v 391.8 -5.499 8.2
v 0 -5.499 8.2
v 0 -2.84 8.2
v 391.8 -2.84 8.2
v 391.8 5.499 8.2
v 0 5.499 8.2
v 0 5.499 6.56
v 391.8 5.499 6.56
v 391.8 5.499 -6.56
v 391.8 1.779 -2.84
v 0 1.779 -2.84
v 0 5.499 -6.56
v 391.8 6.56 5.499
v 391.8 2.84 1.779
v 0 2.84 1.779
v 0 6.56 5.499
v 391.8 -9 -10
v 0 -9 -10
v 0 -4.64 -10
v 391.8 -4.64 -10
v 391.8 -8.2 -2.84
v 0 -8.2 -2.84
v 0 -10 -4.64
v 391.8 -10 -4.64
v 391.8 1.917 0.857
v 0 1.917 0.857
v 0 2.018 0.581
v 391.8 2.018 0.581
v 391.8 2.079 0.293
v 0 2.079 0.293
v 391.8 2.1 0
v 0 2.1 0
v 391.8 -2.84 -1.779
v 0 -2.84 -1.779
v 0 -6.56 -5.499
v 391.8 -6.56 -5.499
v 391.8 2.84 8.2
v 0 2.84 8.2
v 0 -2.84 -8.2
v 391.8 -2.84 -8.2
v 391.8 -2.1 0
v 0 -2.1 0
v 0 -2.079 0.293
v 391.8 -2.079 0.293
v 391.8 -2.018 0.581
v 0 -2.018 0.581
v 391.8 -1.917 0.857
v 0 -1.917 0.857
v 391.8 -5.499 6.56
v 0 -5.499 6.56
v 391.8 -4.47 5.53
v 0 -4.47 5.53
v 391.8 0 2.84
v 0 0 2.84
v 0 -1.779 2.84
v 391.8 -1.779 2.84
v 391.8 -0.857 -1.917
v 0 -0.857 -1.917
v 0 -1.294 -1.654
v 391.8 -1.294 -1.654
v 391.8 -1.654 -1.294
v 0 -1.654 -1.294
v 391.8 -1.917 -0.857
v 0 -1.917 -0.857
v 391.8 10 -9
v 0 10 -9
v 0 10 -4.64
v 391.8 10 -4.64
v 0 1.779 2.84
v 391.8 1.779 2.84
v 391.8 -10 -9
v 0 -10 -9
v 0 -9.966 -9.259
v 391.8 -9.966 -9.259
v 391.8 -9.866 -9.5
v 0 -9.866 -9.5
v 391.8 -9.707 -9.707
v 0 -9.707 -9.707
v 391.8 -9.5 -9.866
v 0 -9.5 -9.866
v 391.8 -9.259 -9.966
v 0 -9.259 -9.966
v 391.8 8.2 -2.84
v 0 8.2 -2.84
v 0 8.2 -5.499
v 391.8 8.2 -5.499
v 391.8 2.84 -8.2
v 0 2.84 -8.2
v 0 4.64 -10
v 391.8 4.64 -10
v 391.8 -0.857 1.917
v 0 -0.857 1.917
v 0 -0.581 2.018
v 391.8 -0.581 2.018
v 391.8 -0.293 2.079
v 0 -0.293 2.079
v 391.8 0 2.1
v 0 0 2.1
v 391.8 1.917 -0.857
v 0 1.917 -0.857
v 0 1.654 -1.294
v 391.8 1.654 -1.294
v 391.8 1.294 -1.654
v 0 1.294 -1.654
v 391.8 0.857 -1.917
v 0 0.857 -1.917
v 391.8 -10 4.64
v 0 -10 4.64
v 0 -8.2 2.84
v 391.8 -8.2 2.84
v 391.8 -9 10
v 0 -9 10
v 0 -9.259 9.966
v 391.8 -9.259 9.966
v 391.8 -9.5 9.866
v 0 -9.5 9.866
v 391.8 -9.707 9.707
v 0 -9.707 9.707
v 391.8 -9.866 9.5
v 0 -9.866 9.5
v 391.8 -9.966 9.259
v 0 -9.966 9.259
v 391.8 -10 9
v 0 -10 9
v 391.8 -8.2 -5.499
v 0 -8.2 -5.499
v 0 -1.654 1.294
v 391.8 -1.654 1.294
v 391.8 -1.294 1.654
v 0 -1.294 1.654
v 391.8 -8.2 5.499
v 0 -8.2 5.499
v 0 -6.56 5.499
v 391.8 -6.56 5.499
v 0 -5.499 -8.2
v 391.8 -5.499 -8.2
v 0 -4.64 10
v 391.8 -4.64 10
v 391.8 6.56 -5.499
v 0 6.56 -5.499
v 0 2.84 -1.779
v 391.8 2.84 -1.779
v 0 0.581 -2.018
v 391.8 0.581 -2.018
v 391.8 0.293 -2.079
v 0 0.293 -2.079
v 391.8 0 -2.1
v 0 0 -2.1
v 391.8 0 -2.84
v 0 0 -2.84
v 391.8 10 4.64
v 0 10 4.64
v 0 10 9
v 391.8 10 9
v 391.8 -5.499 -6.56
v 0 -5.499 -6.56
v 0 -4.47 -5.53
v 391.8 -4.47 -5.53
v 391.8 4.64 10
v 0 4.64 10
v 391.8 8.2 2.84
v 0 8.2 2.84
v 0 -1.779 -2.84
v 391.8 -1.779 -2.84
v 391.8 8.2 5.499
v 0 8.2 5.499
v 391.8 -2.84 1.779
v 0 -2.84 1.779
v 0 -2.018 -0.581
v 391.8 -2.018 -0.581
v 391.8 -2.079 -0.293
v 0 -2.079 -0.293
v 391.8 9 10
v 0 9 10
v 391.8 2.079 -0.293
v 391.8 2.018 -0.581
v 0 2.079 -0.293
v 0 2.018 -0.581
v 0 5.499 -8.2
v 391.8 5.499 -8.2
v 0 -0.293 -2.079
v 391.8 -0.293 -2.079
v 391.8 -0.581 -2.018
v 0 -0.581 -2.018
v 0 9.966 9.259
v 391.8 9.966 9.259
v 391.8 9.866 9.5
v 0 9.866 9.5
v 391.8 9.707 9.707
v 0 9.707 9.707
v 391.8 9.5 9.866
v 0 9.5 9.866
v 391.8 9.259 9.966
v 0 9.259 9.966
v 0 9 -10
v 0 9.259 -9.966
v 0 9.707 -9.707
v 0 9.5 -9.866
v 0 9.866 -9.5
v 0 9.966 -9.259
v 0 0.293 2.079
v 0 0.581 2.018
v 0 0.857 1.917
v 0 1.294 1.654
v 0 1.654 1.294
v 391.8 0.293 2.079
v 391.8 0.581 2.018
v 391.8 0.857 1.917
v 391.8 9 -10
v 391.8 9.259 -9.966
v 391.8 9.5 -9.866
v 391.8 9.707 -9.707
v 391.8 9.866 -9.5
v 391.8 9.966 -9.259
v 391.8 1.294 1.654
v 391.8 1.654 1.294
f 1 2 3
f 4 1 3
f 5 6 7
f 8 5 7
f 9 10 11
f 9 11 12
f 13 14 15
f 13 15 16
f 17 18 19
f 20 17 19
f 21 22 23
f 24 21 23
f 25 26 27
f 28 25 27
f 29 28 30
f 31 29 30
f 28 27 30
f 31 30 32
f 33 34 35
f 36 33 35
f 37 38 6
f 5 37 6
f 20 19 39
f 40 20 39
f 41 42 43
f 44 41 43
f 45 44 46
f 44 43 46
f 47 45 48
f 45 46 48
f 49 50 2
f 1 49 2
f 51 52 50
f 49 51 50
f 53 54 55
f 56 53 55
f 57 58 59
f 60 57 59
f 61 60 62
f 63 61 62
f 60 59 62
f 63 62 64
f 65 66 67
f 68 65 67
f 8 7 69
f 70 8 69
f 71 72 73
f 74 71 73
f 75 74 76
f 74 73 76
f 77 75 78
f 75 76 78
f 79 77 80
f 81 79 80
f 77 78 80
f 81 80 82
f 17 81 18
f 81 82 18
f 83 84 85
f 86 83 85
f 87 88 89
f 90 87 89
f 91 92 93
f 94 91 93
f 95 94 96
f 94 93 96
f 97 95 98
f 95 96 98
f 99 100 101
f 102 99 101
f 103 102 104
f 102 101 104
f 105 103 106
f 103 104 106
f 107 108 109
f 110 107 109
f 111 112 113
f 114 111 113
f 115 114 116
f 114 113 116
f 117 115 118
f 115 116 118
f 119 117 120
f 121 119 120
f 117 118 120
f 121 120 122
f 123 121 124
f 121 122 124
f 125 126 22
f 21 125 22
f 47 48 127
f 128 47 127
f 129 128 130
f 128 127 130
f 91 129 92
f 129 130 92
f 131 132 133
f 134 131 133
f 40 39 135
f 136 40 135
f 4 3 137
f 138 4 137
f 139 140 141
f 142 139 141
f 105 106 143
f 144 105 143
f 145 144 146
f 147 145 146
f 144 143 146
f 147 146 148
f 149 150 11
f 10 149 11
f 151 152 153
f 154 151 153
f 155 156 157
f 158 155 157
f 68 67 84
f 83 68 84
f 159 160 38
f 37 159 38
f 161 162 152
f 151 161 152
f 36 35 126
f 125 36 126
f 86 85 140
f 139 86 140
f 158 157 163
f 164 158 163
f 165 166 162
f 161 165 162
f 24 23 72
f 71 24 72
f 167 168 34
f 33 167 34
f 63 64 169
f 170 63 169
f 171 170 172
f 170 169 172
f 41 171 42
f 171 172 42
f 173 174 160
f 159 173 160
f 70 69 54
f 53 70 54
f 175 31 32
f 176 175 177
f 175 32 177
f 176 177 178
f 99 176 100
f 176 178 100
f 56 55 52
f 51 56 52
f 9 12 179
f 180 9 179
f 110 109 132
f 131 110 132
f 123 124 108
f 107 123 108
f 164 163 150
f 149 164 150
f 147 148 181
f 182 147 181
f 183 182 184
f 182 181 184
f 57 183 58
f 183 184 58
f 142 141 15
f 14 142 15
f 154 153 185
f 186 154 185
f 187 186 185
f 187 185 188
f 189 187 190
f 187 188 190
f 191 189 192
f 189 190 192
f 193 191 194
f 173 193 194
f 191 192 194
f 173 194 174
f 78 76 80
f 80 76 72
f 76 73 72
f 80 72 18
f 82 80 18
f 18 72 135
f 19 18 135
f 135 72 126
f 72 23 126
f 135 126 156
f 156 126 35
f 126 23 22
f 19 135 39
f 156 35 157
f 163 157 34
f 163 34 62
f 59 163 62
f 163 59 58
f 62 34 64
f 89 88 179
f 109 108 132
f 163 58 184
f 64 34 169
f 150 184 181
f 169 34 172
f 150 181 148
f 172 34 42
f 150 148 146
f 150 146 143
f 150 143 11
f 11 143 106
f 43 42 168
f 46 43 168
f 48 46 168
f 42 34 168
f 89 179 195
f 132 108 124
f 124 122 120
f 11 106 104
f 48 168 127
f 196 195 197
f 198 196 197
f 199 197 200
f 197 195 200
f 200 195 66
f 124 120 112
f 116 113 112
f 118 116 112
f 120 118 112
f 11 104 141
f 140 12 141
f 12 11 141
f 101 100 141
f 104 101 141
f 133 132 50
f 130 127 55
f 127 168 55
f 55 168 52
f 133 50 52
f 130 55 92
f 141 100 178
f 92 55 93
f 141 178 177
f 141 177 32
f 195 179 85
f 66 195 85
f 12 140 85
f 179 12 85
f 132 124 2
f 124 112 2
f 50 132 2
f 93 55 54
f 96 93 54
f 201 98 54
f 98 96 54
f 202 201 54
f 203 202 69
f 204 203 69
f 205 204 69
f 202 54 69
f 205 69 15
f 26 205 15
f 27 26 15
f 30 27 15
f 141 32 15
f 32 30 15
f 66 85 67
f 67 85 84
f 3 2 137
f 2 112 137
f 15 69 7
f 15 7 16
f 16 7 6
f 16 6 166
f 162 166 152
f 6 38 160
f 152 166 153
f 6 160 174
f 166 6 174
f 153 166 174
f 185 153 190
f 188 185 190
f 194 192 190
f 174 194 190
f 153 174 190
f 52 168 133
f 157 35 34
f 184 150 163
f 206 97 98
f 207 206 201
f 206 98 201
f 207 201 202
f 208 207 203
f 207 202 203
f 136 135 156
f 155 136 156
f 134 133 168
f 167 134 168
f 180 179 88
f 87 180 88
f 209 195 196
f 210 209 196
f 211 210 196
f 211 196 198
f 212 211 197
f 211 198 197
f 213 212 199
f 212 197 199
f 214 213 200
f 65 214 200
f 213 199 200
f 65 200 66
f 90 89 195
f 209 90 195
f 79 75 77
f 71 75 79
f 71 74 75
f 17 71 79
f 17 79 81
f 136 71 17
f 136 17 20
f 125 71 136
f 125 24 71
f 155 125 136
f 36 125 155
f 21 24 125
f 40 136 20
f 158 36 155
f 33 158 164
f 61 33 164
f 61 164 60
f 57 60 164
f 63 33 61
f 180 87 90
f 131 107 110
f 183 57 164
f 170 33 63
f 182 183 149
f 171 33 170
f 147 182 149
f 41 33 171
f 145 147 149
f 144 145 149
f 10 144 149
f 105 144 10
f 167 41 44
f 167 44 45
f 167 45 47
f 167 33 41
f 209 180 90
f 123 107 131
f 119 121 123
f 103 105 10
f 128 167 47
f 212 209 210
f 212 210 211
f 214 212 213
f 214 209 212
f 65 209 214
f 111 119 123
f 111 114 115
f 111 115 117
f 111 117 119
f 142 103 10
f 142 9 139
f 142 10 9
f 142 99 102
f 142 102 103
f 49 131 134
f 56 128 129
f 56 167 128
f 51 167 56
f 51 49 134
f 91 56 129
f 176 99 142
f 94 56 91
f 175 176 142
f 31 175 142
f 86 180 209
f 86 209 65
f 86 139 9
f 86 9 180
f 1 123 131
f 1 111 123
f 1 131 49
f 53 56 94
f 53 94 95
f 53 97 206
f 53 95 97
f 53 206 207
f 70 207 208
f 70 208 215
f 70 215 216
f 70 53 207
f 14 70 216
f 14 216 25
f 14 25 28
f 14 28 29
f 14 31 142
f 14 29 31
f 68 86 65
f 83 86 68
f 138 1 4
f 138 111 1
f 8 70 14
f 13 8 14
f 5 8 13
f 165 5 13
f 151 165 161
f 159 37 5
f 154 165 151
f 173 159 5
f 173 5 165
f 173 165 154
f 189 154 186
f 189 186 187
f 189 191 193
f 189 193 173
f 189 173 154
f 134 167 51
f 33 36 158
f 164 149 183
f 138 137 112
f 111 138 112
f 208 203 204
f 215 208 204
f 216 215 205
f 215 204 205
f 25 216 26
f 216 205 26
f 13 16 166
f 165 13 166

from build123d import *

# Parameters (mm, degrees)
F1_DEPTH = 391.8


# Not quite as in the source:
# - ends of sketch curves that miss each other by under 0.0002 mm in the source are joined


with BuildPart() as f1:
    # F0 (on Right) → F1 (new body)
    with BuildSketch(Plane.YZ):
        with BuildLine():
            Line((8.2, -10), (9, -10))
            ThreePointArc((9, -10), (9.7071067812, -9.7071067812), (10, -9))
            Line((10, -9), (10, -8.2))
            Line((10, -8.2), (8.2, -8.2))
            Line((8.2, -8.2), (8.2, -10))
        make_face()
        Polygon((5.4993398282, -8.2), (7.1393398282, -8.2), (5.4993398282, -6.56), align=None)
        Polygon((6.56, -5.4993398282), (8.2, -7.1393398282), (8.2, -5.4993398282), align=None)
        with BuildLine():
            Line((8.2, 10), (8.2, 8.2))
            Line((8.2, 8.2), (10, 8.2))
            Line((10, 8.2), (10, 9))
            ThreePointArc((10, 9), (9.7071067812, 9.7071067812), (9, 10))
            Line((9, 10), (8.2, 10))
        make_face()
        Polygon((8.2, 7.1393398282), (6.56, 5.4993398282), (8.2, 5.4993398282), align=None)
        Polygon((5.4993398282, 8.2), (5.4993398282, 6.56), (7.1393398282, 8.2), align=None)
        with BuildLine():
            Line((-9.9999004684, 8.2000055944), (-8.1999004684, 8.2000055944))
            Line((-8.1999004684, 8.2000055944), (-8.1999004684, 10.0000055944))
            Line((-8.1999004684, 10.0000055944), (-8.9999004684, 10.0000055944))
            ThreePointArc((-8.9999004684, 10.0000055944), (-9.7070072496, 9.7071123756), (-9.9999004684, 9.0000055944))
            Line((-9.9999004684, 9.0000055944), (-9.9999004684, 8.2000055944))
        make_face()
        Polygon((-7.1392402967, 8.2000055944), (-5.4992402967, 6.5600055944), (-5.4992402967, 8.2000055944), align=None)
        Polygon((-8.1999004684, 5.4993454226), (-6.5599004684, 5.4993454226), (-8.1999004684, 7.1393454226), align=None)
        with BuildLine():
            Line((-8.1999004684, -9.9999944056), (-8.1999004684, -8.1999944056))
            Line((-8.1999004684, -8.1999944056), (-9.9999004684, -8.1999944056))
            Line((-9.9999004684, -8.1999944056), (-9.9999004684, -8.9999944056))
            ThreePointArc((-9.9999004684, -8.9999944056), (-9.7070072496, -9.7071011868), (-8.9999004684, -9.9999944056))
            Line((-8.9999004684, -9.9999944056), (-8.1999004684, -9.9999944056))
        make_face()
        Polygon((-8.1999004684, -7.1393342338), (-6.5599004684, -5.4993342338), (-8.1999004684, -5.4993342338), align=None)
        Polygon((-5.4992402967, -8.1999944056), (-5.4992402967, -6.5599944056), (-7.1392402967, -8.1999944056), align=None)
        with BuildLine():
            Line((1.9173232366, -0.8566630648), (2.84, -1.7793398282))
            Line((2.84, -1.7793398282), (2.84, 0))
            Line((2.84, 0), (2.1, 0))
            ThreePointArc((2.1, 0), (2.0538231176, -0.4379618723), (1.9173232366, -0.8566630648))
        make_face()
        with BuildLine():
            Line((0, -2.84), (1.7793398282, -2.84))
            Line((1.7793398282, -2.84), (0.8566630648, -1.9173232366))
            ThreePointArc((0.8566630648, -1.9173232366), (0.4379618723, -2.0538231176), (0, -2.1))
            Line((0, -2.1), (0, -2.84))
        make_face()
        with BuildLine():
            Line((-1.7792402967, -2.8399944056), (9.95316e-05, -2.8399944056))
            Line((9.95316e-05, -2.8399944056), (0, -2.1))
            ThreePointArc((0, -2.1), (-0.4378623408, -2.0538175232), (-0.8565635332, -1.9173176422))
            Line((-0.8565635332, -1.9173176422), (-1.7792402967, -2.8399944056))
        make_face()
        Polygon((4.64, -10), (8.2, -10), (8.2, -8.2), (7.1393398282, -8.2), (5.4993398282, -8.2), (2.84, -8.2), align=None)
        Polygon((8.2, -8.2), (10, -8.2), (10, -4.64), (8.2, -2.84), (8.2, -5.4993398282), (8.2, -7.1393398282), align=None)
        with BuildLine():
            ThreePointArc((0, 2.1), (0.4379618723, 2.0538231176), (0.8566630648, 1.9173232366))
            Line((0.8566630648, 1.9173232366), (1.7793398282, 2.84))
            Line((1.7793398282, 2.84), (0, 2.84))
            Line((0, 2.84), (0, 2.1))
        make_face()
        with BuildLine():
            Line((2.1, 0), (2.84, 0))
            Line((2.84, 0), (2.84, 1.7793398282))
            Line((2.84, 1.7793398282), (1.9173232366, 0.8566630648))
            ThreePointArc((1.9173232366, 0.8566630648), (2.0538231176, 0.4379618723), (2.1, 0))
        make_face()
        with BuildLine():
            ThreePointArc((-0.8565635332, 1.917328831), (-0.4378623408, 2.053828712), (9.95316e-05, 2.1000055944))
            Line((9.95316e-05, 2.1000055944), (0, 2.84))
            Line((0, 2.84), (-1.7792402967, 2.8400055944))
            Line((-1.7792402967, 2.8400055944), (-0.8565635332, 1.917328831))
        make_face()
        Polygon((8.2, 8.2), (8.2, 7.1393398282), (8.2, 5.4993398282), (8.2, 2.84), (10, 4.64), (10, 8.2), align=None)
        Polygon((7.1393398282, 8.2), (8.2, 8.2), (8.2, 10), (4.64, 10), (2.84, 8.2), (5.4993398282, 8.2), align=None)
        with BuildLine():
            Line((-2.8399004684, 1.7793454226), (-2.8399004684, 5.5944e-06))
            Line((-2.8399004684, 5.5944e-06), (-2.0999004684, 5.5944e-06))
            ThreePointArc((-2.0999004684, 5.5944e-06), (-2.053723586, 0.4379674667), (-1.917223705, 0.8566686592))
            Line((-1.917223705, 0.8566686592), (-2.8399004684, 1.7793454226))
        make_face()
        Polygon((-8.1999004684, 10.0000055944), (-8.1999004684, 8.2000055944), (-7.1392402967, 8.2000055944), (-5.4992402967, 8.2000055944), (-2.8399004684, 8.2000055944), (-4.6399004684, 10.0000055944), align=None)
        Polygon((-8.1999004684, 5.4993454226), (-8.1999004684, 7.1393454226), (-8.1999004684, 8.2000055944), (-9.9999004684, 8.2000055944), (-9.9999004684, 4.6400055944), (-8.1999004684, 2.8400055944), align=None)
        with BuildLine():
            Line((-2.8399004684, 5.5944e-06), (-2.8399004684, -1.7793342338))
            Line((-2.8399004684, -1.7793342338), (-1.917223705, -0.8566574704))
            ThreePointArc((-1.917223705, -0.8566574704), (-2.053723586, -0.4379562779), (-2.0999004684, 5.5944e-06))
            Line((-2.0999004684, 5.5944e-06), (-2.8399004684, 5.5944e-06))
        make_face()
        Polygon((-9.9999004684, -8.1999944056), (-8.1999004684, -8.1999944056), (-8.1999004684, -7.1393342338), (-8.1999004684, -5.4993342338), (-8.1999004684, -2.8399944056), (-9.9999004684, -4.6399944056), align=None)
        Polygon((-5.4992402967, -8.1999944056), (-7.1392402967, -8.1999944056), (-8.1999004684, -8.1999944056), (-8.1999004684, -9.9999944056), (-4.6399004684, -9.9999944056), (-2.8399004684, -8.1999944056), align=None)
        with BuildLine():
            Line((-2.8399004684, -1.7793342338), (-1.7792402967, -2.8399944056))
            Line((-1.7792402967, -2.8399944056), (-0.8565635332, -1.9173176422))
            ThreePointArc((-0.8565635332, -1.9173176422), (-1.4848247089, -1.4849186461), (-1.917223705, -0.8566574704))
            Line((-1.917223705, -0.8566574704), (-2.8399004684, -1.7793342338))
        make_face()
        Polygon((-4.4695703825, -5.5303244915), (-1.7792402967, -2.8399944056), (-2.8399004684, -1.7793342338), (-5.5302305543, -4.4696643197), (-6.5599004684, -5.4993342338), (-8.1999004684, -7.1393342338), (-8.1999004684, -8.1999944056), (-7.1392402967, -8.1999944056), (-5.4992402967, -6.5599944056), align=None)
        with BuildLine():
            Line((7.1393398282, -8.2), (8.2, -8.2))
            Line((8.2, -8.2), (8.2, -7.1393398282))
            Line((8.2, -7.1393398282), (6.56, -5.4993398282))
            Line((6.56, -5.4993398282), (5.5303300859, -4.4696699141))
            Line((5.5303300859, -4.4696699141), (2.84, -1.7793398282))
            Line((2.84, -1.7793398282), (1.9173232366, -0.8566630648))
            ThreePointArc((1.9173232366, -0.8566630648), (1.4849242405, -1.4849242405), (0.8566630648, -1.9173232366))
            Line((0.8566630648, -1.9173232366), (1.7793398282, -2.84))
            Line((1.7793398282, -2.84), (4.4696699141, -5.5303300859))
            Line((4.4696699141, -5.5303300859), (5.4993398282, -6.56))
            Line((5.4993398282, -6.56), (7.1393398282, -8.2))
        make_face()
        with BuildLine():
            Line((1.9173232366, 0.8566630648), (2.84, 1.7793398282))
            Line((2.84, 1.7793398282), (5.5303300859, 4.4696699141))
            Line((5.5303300859, 4.4696699141), (6.56, 5.4993398282))
            Line((6.56, 5.4993398282), (8.2, 7.1393398282))
            Line((8.2, 7.1393398282), (8.2, 8.2))
            Line((8.2, 8.2), (7.1393398282, 8.2))
            Line((7.1393398282, 8.2), (5.4993398282, 6.56))
            Line((5.4993398282, 6.56), (4.4696699141, 5.5303300859))
            Line((4.4696699141, 5.5303300859), (1.7793398282, 2.84))
            Line((1.7793398282, 2.84), (0.8566630648, 1.9173232366))
            ThreePointArc((0.8566630648, 1.9173232366), (1.4849242405, 1.4849242405), (1.9173232366, 0.8566630648))
        make_face()
        with BuildLine():
            Line((-5.5302305543, 4.4696755085), (-2.8399004684, 1.7793454226))
            Line((-2.8399004684, 1.7793454226), (-1.917223705, 0.8566686592))
            ThreePointArc((-1.917223705, 0.8566686592), (-1.4848247089, 1.4849298349), (-0.8565635332, 1.917328831))
            Line((-0.8565635332, 1.917328831), (-1.7792402967, 2.8400055944))
            Line((-1.7792402967, 2.8400055944), (-4.4695703825, 5.5303356803))
            Line((-4.4695703825, 5.5303356803), (-5.4992402967, 6.5600055944))
            Line((-5.4992402967, 6.5600055944), (-7.1392402967, 8.2000055944))
            Line((-7.1392402967, 8.2000055944), (-8.1999004684, 8.2000055944))
            Line((-8.1999004684, 8.2000055944), (-8.1999004684, 7.1393454226))
            Line((-8.1999004684, 7.1393454226), (-6.5599004684, 5.4993454226))
            Line((-6.5599004684, 5.4993454226), (-5.5302305543, 4.4696755085))
        make_face()
    extrude(amount=F1_DEPTH)


solid = f1.part
